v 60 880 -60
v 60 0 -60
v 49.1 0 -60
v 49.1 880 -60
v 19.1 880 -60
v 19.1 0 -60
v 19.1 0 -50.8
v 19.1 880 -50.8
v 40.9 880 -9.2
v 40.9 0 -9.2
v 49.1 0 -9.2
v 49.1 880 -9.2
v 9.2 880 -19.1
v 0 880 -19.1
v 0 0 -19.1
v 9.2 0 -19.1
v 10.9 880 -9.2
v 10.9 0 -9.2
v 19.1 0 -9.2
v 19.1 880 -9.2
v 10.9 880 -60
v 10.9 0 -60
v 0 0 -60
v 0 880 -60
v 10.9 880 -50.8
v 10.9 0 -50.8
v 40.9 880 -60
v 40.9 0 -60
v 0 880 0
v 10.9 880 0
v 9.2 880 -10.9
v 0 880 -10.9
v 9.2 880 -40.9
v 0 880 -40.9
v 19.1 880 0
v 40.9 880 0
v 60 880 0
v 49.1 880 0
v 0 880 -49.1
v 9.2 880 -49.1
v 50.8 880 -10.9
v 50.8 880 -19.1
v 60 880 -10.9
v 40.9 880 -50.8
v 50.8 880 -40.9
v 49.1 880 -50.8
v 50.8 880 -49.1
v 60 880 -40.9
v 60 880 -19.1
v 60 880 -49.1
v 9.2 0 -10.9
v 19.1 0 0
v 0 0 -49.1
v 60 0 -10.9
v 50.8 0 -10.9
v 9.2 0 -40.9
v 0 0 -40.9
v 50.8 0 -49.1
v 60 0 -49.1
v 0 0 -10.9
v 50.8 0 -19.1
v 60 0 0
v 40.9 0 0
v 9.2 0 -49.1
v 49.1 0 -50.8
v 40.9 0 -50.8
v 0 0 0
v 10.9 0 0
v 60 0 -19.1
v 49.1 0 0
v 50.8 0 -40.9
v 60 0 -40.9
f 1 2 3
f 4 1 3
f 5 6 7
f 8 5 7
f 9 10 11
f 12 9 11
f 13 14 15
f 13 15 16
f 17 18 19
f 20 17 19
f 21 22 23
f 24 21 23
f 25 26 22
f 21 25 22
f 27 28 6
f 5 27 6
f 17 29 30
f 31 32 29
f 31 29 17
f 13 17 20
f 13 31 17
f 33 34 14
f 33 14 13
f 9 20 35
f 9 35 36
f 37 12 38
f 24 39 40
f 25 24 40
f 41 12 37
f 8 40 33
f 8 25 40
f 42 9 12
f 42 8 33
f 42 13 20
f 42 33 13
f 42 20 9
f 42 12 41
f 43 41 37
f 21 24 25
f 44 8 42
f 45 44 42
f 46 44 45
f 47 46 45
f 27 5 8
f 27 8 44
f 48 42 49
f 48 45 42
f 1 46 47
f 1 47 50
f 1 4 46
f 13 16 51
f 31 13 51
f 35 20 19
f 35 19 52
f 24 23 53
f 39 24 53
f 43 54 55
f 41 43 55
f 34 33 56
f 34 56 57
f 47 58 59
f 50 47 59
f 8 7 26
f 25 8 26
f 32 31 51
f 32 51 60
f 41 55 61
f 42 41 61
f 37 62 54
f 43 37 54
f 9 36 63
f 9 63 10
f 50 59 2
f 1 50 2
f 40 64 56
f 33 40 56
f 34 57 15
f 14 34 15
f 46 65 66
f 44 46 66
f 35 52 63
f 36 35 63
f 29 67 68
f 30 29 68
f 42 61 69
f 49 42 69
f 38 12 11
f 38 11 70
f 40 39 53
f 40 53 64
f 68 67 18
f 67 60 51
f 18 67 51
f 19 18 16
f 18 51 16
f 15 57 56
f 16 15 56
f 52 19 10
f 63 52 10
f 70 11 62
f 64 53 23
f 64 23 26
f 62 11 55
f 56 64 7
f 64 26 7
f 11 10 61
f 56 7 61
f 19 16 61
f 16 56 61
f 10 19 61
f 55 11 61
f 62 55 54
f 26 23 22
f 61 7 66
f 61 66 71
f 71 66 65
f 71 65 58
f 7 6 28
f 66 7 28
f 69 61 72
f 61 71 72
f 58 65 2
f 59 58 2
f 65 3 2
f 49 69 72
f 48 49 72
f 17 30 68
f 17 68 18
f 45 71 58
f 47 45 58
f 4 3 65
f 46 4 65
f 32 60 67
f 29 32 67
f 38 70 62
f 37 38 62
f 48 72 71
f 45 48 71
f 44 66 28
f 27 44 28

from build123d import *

# Parameters (mm, degrees)
EXTRUDE_1_DEPTH = 880


with BuildPart() as part:
    # 草图1 → 凸台-拉伸1 (new body)
    with BuildSketch(Plane(origin=(0, 0, 0), x_dir=(1, 0, 0), z_dir=(0, 1, 0))):
        Polygon((10.9, 60), (0, 60), (0, 49.1), (9.2, 49.1), (9.2, 40.9), (0, 40.9), (0, 30), (30, 30), (30, 60), (19.1, 60), (19.1, 50.8), (10.9, 50.8), align=None)
        Polygon((30, 30), (0, 30), (0, 19.1), (9.2, 19.1), (9.2, 10.9), (0, 10.9), (0, 0), (10.9, 0), (10.9, 9.2), (19.1, 9.2), (19.1, 0), (40.9, 0), (40.9, 9.2), (49.1, 9.2), (49.1, 0), (60, 0), (60, 10.9), (50.8, 10.9), (50.8, 19.1), (60, 19.1), (60, 40.9), (50.8, 40.9), (50.8, 49.1), (60, 49.1), (60, 60), (49.1, 60), (49.1, 50.8), (40.9, 50.8), (40.9, 60), (30, 60), align=None)
    extrude(amount=EXTRUDE_1_DEPTH)


solid = part.part
